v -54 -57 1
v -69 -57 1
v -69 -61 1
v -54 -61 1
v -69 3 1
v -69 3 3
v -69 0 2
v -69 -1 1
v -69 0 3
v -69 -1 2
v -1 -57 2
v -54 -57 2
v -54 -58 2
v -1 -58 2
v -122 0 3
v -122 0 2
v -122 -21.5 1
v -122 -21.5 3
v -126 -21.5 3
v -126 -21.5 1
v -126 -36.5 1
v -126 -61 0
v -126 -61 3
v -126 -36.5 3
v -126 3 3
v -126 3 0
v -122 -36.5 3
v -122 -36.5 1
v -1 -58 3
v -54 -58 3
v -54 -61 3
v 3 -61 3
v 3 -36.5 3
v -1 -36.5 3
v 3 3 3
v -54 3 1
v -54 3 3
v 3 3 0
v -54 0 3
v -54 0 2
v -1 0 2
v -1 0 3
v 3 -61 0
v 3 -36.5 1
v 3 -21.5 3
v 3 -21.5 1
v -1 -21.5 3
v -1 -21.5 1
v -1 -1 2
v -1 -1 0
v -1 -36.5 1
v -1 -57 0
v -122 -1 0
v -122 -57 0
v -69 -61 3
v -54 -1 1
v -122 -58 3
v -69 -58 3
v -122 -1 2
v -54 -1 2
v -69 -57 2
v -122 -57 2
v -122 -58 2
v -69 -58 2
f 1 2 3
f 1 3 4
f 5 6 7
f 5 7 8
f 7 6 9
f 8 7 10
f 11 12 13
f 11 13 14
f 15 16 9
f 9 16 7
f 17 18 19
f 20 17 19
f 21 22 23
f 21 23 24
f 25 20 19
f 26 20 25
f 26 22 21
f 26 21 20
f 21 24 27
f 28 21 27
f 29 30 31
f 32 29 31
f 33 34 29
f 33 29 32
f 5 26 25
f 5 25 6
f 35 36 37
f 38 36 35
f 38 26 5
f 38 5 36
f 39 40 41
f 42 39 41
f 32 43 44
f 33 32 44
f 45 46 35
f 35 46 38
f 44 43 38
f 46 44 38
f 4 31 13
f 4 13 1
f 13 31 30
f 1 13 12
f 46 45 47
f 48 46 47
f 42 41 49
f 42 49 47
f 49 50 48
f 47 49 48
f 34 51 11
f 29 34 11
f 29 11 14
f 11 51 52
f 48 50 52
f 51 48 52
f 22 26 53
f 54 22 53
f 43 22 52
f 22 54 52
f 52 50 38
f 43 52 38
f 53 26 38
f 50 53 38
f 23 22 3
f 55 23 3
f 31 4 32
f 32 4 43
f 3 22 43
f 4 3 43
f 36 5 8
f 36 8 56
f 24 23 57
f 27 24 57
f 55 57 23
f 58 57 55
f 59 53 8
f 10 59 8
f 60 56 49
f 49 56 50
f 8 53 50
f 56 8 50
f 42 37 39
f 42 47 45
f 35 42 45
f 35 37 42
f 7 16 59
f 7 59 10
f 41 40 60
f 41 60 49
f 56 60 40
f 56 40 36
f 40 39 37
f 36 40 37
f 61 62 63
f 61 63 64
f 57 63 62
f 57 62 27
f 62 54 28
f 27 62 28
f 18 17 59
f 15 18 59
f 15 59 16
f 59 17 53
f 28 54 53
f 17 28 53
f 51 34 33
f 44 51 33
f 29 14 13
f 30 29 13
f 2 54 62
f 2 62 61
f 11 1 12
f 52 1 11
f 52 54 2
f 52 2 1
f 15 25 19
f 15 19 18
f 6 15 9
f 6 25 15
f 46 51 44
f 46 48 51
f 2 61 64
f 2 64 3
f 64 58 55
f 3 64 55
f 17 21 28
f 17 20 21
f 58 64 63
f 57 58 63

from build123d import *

# Parameters (mm, degrees)
F0_W     = 129
F0_H     = 64
F0_W_2   = 123
F0_H_2   = 58
F0_W_3   = 121
F0_H_3   = 56
F1_DEPTH = 2
F2_W     = 129
F2_H     = 64
F3_DEPTH = 1
F4_W     = 15
F4_H     = 36.0279009569
F4_H_2   = 3
F4_H_3   = 6.1532862581
F4_W_2   = 4
F4_H_4   = 15
F4_W_3   = 3.5279009569
F4_W_4   = 37.6532862581
F5_DEPTH = 2


with BuildPart() as f1:
    # F0 (on Top) → F1 (new body)
    with BuildSketch(Plane.XY):
        with Locations((-61.5, -29)):
            Rectangle(F0_W, F0_H)
        with Locations((-61.5, -29)):
            Rectangle(F0_W_2, F0_H_2, mode=Mode.SUBTRACT)
        with Locations((-61.5, -29)):
            Rectangle(F0_W_2, F0_H_2)
        with Locations((-61.5, -29)):
            Rectangle(F0_W_3, F0_H_3, mode=Mode.SUBTRACT)
    extrude(amount=F1_DEPTH)

    # F2 (on face) → F3 (join)
    with BuildSketch(Plane.XY.offset(2)):
        with Locations((-61.5, -29)):
            Rectangle(F2_W, F2_H)
        Polygon((-122, 0), (-1, 0), (-1, -1), (-1, -57), (-1, -58), (-122, -58), (-122, -57), (-122, -1), align=None, mode=Mode.SUBTRACT)
    extrude(amount=F3_DEPTH)

    # F4 (on face) → F5 (cut)
    with BuildSketch(Plane.XY.offset(3)):
        with Locations((-61.5, 21.0139504785)):
            Rectangle(F4_W, F4_H)
        with Locations((-61.5, 1.5)):
            Rectangle(F4_W, F4_H_2)
        with Locations((-61.5, -3.0766431291)):
            Rectangle(F4_W, F4_H_3)
        with Locations((1, -29)):
            Rectangle(F4_W_2, F4_H_4)
        with Locations((4.7639504785, -29)):
            Rectangle(F4_W_3, F4_H_4)
        with Locations((-19.8266431291, -29)):
            Rectangle(F4_W_4, F4_H_4)
        with Locations((-61.5, -59.5)):
            Rectangle(F4_W, F4_H_2)
        with Locations((-61.5, -54.9233568709)):
            Rectangle(F4_W, F4_H_3)
        with Locations((-61.5, -79.0139504785)):
            Rectangle(F4_W, F4_H)
        with Locations((-103.1733568709, -29)):
            Rectangle(F4_W_4, F4_H_4)
        with Locations((-124, -29)):
            Rectangle(F4_W_2, F4_H_4)
        with Locations((-127.7639504785, -29)):
            Rectangle(F4_W_3, F4_H_4)
    extrude(amount=-F5_DEPTH, mode=Mode.SUBTRACT)


solid = f1.part
